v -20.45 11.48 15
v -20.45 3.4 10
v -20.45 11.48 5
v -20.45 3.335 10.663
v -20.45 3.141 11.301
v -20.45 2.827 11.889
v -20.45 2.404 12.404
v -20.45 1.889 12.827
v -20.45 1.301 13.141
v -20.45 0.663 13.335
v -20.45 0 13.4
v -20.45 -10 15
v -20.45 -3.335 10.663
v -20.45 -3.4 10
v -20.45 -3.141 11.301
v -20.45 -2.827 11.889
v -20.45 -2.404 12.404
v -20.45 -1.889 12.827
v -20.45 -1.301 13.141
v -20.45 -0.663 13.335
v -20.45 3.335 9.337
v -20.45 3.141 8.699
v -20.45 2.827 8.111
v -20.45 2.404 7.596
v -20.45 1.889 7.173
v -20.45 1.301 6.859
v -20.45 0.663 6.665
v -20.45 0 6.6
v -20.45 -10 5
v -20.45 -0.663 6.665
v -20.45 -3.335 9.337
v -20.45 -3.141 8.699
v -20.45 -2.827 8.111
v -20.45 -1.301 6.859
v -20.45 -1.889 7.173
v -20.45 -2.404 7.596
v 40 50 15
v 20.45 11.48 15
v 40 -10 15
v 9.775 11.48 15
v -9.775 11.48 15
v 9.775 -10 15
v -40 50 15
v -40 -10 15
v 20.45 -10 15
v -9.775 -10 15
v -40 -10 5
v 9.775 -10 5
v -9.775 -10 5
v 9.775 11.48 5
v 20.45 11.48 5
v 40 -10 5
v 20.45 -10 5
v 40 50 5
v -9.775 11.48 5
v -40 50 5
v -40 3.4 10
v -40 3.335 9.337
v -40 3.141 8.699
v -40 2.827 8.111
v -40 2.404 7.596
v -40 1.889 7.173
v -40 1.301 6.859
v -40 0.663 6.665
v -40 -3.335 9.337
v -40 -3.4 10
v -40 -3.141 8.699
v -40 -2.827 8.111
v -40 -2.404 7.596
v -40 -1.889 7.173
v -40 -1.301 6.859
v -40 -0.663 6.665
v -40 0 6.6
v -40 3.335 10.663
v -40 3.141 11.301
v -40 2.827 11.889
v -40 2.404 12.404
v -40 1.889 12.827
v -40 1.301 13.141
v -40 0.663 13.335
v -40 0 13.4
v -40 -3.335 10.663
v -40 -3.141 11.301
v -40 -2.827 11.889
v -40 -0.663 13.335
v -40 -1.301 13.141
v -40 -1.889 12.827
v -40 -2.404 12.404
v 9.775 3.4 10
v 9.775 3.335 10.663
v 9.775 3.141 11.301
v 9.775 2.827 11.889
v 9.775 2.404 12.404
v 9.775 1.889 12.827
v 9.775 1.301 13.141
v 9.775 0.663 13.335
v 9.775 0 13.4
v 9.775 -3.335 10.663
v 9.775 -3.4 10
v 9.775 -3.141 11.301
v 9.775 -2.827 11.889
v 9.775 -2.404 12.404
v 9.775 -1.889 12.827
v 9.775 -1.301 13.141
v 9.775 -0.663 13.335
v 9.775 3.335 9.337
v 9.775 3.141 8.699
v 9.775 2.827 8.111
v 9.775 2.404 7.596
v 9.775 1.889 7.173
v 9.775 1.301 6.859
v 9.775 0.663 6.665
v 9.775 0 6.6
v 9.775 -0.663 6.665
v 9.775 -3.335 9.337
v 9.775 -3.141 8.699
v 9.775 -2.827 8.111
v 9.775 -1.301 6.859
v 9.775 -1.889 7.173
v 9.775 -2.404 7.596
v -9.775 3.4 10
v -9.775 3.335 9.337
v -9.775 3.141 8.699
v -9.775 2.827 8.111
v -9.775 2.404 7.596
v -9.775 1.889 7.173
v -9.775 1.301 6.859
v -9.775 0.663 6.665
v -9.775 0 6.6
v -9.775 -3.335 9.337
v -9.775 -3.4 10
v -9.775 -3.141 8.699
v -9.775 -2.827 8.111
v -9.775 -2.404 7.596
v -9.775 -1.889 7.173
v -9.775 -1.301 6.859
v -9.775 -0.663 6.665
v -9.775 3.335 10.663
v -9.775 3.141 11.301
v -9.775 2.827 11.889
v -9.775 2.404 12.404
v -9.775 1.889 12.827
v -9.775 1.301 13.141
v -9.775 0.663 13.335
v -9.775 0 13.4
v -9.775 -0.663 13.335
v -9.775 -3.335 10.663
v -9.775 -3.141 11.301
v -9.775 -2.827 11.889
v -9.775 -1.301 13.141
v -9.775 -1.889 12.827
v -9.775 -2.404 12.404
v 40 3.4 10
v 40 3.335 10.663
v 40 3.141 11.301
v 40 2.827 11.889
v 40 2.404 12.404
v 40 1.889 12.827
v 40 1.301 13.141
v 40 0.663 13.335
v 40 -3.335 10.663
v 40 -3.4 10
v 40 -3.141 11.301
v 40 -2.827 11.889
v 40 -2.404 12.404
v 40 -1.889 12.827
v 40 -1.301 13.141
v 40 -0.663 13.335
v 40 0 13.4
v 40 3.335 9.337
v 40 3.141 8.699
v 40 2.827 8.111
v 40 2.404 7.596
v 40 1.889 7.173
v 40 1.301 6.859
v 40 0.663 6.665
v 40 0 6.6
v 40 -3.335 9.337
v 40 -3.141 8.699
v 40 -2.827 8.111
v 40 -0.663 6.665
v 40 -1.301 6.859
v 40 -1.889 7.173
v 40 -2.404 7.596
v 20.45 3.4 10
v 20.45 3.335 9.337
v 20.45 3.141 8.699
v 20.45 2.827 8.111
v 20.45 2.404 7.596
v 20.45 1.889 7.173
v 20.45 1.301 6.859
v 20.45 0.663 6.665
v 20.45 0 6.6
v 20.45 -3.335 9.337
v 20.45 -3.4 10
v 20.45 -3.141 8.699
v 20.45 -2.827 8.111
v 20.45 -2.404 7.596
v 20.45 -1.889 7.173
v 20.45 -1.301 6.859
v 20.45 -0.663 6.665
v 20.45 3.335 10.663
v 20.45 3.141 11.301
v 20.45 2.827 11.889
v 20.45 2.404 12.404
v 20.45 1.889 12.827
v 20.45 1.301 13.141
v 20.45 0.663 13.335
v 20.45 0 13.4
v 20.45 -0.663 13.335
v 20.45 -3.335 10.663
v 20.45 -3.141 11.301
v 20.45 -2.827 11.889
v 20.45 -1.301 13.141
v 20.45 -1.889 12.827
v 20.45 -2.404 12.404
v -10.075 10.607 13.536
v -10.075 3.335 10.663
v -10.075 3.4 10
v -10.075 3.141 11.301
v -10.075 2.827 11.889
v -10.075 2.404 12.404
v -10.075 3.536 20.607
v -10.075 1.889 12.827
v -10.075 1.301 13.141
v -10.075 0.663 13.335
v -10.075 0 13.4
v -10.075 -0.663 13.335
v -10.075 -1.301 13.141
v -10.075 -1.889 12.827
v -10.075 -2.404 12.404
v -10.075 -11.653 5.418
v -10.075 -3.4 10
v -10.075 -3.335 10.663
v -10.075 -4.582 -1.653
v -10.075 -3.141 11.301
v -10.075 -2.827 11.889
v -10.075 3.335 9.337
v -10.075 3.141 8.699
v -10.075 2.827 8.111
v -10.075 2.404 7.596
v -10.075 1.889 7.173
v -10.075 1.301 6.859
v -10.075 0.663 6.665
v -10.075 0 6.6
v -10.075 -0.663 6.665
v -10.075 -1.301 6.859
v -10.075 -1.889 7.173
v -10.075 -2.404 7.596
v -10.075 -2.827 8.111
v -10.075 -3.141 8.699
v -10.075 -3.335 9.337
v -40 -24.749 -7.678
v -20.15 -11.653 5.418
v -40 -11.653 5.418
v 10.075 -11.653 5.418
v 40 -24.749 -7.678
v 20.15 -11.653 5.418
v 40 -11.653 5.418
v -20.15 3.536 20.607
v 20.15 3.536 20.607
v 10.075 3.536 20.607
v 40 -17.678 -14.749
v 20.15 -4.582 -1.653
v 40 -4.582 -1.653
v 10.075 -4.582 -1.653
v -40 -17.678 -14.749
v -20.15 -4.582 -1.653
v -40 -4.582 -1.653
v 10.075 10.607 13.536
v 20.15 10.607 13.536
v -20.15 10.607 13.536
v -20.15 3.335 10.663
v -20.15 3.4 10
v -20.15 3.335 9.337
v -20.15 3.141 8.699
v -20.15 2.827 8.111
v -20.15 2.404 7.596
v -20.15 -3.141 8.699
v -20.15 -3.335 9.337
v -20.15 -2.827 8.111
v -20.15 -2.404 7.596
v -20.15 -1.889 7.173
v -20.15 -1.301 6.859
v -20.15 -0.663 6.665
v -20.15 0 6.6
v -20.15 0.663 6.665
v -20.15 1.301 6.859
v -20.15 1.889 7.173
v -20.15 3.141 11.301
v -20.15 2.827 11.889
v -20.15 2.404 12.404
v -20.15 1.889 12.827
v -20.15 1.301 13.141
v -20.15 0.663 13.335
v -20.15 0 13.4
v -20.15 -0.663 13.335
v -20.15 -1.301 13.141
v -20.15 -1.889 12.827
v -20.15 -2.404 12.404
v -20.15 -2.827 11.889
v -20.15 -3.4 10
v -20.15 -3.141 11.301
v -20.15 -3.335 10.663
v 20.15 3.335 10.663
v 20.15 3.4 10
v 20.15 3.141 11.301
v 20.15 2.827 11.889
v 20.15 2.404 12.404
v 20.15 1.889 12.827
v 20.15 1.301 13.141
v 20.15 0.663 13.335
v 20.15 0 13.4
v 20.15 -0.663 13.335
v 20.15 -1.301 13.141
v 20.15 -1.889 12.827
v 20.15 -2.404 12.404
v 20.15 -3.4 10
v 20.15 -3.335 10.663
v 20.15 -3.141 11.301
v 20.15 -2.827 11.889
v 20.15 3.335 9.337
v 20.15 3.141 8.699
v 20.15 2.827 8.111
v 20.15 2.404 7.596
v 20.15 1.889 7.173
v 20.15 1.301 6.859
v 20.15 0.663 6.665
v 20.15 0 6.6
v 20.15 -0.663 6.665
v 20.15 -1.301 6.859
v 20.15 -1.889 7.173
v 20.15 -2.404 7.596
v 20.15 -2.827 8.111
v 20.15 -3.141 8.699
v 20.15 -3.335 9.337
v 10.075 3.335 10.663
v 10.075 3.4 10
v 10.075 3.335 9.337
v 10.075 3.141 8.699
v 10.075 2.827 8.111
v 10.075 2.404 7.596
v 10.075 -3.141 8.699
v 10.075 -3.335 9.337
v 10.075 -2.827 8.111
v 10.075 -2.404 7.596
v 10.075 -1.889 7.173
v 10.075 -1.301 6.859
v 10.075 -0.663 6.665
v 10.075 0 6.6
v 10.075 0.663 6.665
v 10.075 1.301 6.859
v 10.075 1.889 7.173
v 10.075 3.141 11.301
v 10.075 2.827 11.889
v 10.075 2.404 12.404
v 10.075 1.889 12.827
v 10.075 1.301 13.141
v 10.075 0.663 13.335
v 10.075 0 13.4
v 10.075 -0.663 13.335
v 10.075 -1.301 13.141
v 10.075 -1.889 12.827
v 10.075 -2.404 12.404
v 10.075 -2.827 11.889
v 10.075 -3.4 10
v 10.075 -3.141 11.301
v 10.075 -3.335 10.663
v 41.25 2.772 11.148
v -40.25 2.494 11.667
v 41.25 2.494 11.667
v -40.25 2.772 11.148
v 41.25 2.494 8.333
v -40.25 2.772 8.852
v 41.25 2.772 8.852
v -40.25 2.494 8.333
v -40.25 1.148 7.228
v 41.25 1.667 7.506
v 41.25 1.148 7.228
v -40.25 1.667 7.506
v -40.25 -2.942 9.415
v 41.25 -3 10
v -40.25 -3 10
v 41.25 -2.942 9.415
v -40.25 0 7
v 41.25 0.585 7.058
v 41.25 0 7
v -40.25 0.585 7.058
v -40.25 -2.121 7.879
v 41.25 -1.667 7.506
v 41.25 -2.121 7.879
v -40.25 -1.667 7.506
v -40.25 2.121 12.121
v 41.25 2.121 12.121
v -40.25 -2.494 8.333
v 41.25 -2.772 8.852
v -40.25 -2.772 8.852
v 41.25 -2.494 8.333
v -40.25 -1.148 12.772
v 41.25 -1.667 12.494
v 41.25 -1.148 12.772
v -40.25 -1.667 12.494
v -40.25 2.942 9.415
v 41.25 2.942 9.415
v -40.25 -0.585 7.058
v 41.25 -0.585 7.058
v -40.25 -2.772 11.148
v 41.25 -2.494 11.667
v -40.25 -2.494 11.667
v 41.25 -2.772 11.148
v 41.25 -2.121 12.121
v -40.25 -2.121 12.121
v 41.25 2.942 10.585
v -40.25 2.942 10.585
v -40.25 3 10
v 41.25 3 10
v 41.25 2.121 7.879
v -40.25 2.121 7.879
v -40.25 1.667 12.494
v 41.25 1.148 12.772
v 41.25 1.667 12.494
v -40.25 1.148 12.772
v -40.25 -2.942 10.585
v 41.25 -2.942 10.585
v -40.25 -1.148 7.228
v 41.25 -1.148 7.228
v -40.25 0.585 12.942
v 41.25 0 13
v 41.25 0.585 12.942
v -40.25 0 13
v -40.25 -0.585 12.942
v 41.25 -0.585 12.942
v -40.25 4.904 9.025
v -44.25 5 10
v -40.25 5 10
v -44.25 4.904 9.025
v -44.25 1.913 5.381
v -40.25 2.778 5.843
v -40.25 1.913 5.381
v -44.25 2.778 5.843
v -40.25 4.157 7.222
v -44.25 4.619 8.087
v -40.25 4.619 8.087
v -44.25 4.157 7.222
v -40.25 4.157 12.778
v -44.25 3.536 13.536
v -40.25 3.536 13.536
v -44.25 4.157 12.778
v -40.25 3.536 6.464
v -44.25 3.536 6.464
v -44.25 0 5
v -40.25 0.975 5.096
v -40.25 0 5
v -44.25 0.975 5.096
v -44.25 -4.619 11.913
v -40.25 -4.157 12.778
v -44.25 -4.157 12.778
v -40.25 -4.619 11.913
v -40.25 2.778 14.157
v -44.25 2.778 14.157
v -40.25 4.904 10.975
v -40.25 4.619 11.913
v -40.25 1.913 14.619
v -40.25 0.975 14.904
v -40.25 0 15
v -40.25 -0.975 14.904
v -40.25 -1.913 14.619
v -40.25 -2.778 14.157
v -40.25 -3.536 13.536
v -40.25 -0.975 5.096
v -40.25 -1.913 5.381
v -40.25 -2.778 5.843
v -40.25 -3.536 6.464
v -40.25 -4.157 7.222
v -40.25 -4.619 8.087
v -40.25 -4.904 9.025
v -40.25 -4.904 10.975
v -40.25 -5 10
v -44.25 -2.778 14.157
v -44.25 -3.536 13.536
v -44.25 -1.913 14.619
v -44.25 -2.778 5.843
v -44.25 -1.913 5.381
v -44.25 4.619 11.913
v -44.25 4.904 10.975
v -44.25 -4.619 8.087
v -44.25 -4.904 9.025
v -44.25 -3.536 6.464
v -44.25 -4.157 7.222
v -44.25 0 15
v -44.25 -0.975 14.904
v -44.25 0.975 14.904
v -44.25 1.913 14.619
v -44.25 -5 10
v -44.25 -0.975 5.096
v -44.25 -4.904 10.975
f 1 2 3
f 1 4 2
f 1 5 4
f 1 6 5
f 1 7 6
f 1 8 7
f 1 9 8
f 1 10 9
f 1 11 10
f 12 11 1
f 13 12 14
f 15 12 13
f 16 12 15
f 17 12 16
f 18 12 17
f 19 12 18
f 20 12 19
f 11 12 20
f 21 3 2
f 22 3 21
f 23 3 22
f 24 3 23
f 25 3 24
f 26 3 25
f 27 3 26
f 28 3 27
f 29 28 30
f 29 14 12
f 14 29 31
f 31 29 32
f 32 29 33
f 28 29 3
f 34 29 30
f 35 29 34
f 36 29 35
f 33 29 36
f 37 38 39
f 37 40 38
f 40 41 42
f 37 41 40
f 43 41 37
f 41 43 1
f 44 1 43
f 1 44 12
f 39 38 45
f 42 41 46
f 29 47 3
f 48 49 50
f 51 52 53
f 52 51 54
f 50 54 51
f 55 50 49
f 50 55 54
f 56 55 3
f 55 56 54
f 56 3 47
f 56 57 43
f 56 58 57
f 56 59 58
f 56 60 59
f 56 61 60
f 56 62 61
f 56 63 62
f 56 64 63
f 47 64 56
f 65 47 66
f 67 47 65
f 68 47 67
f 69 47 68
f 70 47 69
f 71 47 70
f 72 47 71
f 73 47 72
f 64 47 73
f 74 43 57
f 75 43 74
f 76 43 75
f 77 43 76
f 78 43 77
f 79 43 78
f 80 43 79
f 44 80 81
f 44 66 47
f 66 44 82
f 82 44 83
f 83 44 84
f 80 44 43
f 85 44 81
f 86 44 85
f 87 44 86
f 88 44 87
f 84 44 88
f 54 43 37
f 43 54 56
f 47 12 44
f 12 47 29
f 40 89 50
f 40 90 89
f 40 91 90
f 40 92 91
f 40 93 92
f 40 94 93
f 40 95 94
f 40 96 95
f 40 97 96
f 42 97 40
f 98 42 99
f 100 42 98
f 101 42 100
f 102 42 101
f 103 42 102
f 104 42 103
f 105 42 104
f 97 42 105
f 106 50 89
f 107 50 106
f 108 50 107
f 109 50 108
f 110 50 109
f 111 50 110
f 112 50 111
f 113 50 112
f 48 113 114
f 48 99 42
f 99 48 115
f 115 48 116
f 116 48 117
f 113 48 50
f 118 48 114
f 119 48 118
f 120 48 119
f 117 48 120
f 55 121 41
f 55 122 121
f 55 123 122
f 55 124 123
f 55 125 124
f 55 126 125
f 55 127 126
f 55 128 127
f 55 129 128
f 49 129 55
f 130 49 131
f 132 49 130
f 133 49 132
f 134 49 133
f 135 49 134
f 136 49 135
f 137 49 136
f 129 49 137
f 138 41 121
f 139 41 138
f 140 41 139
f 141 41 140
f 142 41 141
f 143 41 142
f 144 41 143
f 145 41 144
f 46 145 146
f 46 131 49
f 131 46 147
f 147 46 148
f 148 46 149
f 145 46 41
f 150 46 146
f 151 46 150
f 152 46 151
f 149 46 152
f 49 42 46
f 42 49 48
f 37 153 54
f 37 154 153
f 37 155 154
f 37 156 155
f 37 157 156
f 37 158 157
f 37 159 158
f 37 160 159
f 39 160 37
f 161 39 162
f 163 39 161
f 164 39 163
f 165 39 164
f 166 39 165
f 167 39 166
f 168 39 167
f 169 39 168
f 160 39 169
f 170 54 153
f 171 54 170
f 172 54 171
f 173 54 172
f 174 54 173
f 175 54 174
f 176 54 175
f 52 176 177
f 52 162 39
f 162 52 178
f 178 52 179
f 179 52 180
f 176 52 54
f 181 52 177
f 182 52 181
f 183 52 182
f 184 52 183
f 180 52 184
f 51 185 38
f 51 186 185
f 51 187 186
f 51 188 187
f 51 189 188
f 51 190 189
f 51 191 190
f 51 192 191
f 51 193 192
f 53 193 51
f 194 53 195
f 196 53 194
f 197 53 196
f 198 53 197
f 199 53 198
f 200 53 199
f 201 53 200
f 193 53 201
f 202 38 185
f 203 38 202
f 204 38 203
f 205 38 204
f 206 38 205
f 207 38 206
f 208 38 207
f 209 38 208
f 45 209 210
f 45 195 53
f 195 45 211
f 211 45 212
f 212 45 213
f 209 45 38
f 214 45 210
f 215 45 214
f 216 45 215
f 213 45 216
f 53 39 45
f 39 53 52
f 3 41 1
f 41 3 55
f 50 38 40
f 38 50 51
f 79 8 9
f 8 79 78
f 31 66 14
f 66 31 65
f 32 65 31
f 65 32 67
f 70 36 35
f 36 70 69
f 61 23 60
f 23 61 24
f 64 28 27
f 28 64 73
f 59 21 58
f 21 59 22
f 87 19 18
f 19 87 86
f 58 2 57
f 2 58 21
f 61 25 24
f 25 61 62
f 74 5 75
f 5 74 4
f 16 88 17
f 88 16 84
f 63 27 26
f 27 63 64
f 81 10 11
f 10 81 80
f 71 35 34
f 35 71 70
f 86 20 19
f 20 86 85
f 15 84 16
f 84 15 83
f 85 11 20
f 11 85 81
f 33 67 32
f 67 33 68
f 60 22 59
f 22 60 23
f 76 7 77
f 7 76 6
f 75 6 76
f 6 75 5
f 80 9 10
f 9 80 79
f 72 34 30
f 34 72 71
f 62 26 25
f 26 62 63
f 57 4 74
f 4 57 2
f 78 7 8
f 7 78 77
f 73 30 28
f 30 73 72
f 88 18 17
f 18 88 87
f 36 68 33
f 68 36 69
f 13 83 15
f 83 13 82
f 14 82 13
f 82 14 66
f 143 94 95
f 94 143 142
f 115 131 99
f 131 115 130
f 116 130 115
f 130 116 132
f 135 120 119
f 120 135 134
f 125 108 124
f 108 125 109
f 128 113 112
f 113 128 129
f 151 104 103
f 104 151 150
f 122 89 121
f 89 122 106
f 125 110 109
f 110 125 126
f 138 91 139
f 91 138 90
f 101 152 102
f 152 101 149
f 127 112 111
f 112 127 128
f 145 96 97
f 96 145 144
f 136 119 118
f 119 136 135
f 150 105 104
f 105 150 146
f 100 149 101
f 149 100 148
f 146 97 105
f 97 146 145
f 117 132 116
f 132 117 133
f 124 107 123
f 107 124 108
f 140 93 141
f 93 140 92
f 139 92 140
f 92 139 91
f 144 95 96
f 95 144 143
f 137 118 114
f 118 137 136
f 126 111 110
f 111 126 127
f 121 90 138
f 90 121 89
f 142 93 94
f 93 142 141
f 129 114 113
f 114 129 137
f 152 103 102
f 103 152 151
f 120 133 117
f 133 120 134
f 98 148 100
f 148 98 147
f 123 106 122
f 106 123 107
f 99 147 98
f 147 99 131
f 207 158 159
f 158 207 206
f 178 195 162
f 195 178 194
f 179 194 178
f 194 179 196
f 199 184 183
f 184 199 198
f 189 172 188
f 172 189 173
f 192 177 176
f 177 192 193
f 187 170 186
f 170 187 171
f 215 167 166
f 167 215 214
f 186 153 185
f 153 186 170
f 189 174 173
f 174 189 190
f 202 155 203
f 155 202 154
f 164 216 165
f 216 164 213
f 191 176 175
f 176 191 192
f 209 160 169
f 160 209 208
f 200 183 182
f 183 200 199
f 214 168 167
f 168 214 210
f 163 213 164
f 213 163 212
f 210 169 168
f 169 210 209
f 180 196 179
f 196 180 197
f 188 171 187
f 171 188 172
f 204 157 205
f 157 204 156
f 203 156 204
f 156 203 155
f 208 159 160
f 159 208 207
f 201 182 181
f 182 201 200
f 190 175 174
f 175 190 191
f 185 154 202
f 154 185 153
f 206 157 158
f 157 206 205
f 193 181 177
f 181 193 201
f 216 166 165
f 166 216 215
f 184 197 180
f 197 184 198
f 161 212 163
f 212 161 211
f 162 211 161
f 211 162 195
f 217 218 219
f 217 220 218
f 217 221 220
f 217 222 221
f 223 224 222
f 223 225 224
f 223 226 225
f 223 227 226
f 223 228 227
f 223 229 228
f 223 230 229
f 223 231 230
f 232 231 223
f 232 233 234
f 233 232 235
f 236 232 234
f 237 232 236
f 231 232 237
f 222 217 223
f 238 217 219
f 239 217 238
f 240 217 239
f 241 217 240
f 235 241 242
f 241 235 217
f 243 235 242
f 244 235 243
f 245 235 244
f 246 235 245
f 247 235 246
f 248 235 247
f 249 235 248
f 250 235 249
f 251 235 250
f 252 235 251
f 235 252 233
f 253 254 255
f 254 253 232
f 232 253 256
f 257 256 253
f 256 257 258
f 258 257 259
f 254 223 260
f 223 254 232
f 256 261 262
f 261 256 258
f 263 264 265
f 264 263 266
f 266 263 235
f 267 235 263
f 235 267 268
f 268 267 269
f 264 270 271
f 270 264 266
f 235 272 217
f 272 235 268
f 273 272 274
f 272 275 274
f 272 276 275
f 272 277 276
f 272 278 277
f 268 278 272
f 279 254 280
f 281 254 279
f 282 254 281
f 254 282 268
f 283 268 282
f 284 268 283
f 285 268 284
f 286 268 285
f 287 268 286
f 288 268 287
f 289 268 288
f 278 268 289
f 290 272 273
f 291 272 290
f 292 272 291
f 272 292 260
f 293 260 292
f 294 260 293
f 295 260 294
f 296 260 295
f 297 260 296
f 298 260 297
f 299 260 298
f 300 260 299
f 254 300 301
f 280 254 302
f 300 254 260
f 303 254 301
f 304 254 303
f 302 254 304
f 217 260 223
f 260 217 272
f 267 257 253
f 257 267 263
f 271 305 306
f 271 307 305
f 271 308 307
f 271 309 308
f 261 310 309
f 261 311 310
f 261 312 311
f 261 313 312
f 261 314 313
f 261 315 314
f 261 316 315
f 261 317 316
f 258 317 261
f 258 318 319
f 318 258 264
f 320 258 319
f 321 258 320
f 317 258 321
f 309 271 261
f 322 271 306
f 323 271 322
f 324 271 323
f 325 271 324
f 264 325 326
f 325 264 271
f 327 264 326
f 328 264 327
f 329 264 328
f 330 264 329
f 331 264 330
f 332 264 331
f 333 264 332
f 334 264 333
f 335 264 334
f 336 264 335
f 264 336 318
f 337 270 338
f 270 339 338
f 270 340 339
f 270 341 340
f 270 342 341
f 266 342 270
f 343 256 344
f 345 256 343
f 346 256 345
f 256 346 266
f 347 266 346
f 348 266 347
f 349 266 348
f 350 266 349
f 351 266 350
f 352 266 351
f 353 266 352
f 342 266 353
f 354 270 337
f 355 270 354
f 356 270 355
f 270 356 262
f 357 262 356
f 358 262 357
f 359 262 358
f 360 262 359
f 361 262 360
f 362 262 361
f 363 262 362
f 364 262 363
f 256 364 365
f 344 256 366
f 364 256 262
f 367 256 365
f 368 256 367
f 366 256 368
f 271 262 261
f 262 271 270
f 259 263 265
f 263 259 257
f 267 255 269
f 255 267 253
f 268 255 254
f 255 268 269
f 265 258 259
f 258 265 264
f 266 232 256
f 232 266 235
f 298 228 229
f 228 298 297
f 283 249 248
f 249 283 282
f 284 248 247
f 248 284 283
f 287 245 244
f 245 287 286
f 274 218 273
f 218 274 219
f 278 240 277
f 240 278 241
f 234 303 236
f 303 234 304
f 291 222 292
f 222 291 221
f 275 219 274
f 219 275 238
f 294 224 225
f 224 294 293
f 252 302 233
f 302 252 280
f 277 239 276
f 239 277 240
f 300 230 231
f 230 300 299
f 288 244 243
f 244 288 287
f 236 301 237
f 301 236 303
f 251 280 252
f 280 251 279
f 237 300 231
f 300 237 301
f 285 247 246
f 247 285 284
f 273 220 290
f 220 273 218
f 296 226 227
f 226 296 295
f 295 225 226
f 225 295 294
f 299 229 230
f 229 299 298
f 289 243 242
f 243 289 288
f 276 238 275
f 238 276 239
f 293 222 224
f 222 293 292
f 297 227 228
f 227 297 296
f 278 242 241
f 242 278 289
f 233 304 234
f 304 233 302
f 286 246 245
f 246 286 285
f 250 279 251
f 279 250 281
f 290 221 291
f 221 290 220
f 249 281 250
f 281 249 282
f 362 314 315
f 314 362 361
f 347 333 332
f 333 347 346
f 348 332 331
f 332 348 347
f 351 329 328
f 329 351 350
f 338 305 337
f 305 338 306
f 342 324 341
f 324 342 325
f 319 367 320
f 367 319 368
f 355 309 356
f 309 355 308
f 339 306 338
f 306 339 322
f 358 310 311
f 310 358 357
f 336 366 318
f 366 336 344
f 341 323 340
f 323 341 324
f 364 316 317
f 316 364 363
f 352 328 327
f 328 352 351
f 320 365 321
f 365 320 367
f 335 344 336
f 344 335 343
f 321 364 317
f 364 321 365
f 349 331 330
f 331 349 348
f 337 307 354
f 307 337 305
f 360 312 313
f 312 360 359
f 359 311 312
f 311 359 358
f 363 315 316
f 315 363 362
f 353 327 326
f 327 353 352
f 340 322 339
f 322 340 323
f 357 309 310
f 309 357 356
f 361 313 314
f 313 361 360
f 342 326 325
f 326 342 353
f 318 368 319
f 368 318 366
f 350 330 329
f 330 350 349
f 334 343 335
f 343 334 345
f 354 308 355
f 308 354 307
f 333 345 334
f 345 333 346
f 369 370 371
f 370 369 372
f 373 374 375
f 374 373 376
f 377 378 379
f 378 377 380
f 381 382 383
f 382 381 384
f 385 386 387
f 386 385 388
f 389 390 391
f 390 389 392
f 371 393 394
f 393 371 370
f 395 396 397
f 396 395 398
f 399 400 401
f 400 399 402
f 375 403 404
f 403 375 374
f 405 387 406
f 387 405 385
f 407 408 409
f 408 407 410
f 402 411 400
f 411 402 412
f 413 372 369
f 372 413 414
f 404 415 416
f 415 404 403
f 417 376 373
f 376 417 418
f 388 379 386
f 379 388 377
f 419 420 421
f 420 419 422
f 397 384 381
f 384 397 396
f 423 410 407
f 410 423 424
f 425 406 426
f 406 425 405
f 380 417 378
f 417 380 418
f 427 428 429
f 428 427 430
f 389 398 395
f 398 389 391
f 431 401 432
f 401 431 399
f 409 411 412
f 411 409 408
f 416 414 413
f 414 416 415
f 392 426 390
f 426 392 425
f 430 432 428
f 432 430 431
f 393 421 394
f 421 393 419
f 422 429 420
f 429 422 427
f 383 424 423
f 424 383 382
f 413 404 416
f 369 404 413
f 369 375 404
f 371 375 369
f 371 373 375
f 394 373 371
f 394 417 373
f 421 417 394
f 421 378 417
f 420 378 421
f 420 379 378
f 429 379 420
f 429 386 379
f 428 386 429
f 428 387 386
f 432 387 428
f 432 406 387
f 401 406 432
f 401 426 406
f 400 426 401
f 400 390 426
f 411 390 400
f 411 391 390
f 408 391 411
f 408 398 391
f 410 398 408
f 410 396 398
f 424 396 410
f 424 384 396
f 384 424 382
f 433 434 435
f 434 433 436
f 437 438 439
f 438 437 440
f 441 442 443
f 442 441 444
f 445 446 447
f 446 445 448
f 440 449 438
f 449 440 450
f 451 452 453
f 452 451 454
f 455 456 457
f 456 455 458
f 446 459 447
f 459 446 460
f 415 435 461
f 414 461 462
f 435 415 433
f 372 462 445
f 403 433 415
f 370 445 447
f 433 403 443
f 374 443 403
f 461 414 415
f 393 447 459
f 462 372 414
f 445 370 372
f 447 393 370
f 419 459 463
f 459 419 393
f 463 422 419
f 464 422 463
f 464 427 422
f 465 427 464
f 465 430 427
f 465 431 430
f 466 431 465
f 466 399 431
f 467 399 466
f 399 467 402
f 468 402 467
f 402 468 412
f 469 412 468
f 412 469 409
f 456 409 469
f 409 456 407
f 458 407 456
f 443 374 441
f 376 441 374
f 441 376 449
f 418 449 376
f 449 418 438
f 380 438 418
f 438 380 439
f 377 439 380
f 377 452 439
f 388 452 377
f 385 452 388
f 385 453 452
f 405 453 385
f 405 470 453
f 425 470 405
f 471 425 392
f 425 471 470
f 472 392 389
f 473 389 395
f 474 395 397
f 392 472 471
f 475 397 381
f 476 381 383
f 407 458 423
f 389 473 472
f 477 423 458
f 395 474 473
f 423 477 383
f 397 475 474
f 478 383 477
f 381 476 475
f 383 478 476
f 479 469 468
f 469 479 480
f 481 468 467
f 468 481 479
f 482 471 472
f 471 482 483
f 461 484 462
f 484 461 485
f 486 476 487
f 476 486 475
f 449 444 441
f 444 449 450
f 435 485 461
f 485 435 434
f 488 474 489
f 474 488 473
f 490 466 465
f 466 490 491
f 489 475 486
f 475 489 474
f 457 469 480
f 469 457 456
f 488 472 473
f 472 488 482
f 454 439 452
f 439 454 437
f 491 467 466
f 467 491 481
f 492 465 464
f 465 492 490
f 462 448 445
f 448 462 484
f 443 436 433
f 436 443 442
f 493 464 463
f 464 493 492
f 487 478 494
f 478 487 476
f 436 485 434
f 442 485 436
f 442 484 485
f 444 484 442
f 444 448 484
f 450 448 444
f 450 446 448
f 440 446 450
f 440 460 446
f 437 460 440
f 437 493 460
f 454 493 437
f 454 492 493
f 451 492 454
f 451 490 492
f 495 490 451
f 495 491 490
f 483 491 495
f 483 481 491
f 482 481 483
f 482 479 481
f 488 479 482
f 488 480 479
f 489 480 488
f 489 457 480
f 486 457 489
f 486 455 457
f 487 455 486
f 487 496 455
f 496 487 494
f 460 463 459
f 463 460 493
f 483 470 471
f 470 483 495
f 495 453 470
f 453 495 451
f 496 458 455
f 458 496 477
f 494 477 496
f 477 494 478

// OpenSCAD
$fn = 32;

// ------------------------------------------------------------------------
// Butt hinge: hinge 80 mm, leaf swung 45 deg
// Every part is its own module, assembly() places every instance.
// ------------------------------------------------------------------------

// --- part 1 ---
module hinge_base() {
  difference() {
    union() {
      translate([-40, -10, -5]) cube([19.55, 60, 10]);
      translate([-9.775, -10, -5]) cube([19.55, 60, 10]);
      translate([20.45, -10, -5]) cube([19.55, 60, 10]);
      translate([-40, 11.48, -5]) cube([80, 38.52, 10]);
    }
    translate([-30.225, 0, 0]) rotate([0, 90, 0]) cylinder(h = 21.55, d = 6.8, center = true);
    translate([0, 0, 0]) rotate([0, 90, 0]) cylinder(h = 21.55, d = 6.8, center = true);
    translate([30.225, 0, 0]) rotate([0, 90, 0]) cylinder(h = 21.55, d = 6.8, center = true);
  }
}

// --- part 2 ---
module hinge_mover() {
  difference() {
    union() {
      translate([-20.15, -30, -5]) cube([10.075, 40, 10]);
      translate([10.075, -30, -5]) cube([10.075, 40, 10]);
      translate([-40, -30, -5]) cube([80, 18.52, 10]);
    }
    translate([-15.113, 0, 0]) rotate([0, 90, 0]) cylinder(h = 12.075, d = 6.8, center = true);
    translate([15.113, 0, 0]) rotate([0, 90, 0]) cylinder(h = 12.075, d = 6.8, center = true);
  }
}

// --- part 3 ---
module hinge_pin() {
  rotate([0, 90, 0]) cylinder(h = 82.5, d = 6, center = true);
  translate([-44.25, 0, 0]) rotate([0, 90, 0]) cylinder(h = 4, d = 10);
}

// --- assembly ---
module assembly() {
  color([0.80, 0.24, 0.20]) translate([0, 0, 10]) rotate([0, 0, 0]) hinge_base();
  color([0.20, 0.45, 0.75]) translate([0, 0, 10]) rotate([45, 0, 0]) hinge_mover();
  color([0.25, 0.62, 0.32]) translate([0, 0, 10]) rotate([0, 0, 0]) hinge_pin();
}

assembly();
